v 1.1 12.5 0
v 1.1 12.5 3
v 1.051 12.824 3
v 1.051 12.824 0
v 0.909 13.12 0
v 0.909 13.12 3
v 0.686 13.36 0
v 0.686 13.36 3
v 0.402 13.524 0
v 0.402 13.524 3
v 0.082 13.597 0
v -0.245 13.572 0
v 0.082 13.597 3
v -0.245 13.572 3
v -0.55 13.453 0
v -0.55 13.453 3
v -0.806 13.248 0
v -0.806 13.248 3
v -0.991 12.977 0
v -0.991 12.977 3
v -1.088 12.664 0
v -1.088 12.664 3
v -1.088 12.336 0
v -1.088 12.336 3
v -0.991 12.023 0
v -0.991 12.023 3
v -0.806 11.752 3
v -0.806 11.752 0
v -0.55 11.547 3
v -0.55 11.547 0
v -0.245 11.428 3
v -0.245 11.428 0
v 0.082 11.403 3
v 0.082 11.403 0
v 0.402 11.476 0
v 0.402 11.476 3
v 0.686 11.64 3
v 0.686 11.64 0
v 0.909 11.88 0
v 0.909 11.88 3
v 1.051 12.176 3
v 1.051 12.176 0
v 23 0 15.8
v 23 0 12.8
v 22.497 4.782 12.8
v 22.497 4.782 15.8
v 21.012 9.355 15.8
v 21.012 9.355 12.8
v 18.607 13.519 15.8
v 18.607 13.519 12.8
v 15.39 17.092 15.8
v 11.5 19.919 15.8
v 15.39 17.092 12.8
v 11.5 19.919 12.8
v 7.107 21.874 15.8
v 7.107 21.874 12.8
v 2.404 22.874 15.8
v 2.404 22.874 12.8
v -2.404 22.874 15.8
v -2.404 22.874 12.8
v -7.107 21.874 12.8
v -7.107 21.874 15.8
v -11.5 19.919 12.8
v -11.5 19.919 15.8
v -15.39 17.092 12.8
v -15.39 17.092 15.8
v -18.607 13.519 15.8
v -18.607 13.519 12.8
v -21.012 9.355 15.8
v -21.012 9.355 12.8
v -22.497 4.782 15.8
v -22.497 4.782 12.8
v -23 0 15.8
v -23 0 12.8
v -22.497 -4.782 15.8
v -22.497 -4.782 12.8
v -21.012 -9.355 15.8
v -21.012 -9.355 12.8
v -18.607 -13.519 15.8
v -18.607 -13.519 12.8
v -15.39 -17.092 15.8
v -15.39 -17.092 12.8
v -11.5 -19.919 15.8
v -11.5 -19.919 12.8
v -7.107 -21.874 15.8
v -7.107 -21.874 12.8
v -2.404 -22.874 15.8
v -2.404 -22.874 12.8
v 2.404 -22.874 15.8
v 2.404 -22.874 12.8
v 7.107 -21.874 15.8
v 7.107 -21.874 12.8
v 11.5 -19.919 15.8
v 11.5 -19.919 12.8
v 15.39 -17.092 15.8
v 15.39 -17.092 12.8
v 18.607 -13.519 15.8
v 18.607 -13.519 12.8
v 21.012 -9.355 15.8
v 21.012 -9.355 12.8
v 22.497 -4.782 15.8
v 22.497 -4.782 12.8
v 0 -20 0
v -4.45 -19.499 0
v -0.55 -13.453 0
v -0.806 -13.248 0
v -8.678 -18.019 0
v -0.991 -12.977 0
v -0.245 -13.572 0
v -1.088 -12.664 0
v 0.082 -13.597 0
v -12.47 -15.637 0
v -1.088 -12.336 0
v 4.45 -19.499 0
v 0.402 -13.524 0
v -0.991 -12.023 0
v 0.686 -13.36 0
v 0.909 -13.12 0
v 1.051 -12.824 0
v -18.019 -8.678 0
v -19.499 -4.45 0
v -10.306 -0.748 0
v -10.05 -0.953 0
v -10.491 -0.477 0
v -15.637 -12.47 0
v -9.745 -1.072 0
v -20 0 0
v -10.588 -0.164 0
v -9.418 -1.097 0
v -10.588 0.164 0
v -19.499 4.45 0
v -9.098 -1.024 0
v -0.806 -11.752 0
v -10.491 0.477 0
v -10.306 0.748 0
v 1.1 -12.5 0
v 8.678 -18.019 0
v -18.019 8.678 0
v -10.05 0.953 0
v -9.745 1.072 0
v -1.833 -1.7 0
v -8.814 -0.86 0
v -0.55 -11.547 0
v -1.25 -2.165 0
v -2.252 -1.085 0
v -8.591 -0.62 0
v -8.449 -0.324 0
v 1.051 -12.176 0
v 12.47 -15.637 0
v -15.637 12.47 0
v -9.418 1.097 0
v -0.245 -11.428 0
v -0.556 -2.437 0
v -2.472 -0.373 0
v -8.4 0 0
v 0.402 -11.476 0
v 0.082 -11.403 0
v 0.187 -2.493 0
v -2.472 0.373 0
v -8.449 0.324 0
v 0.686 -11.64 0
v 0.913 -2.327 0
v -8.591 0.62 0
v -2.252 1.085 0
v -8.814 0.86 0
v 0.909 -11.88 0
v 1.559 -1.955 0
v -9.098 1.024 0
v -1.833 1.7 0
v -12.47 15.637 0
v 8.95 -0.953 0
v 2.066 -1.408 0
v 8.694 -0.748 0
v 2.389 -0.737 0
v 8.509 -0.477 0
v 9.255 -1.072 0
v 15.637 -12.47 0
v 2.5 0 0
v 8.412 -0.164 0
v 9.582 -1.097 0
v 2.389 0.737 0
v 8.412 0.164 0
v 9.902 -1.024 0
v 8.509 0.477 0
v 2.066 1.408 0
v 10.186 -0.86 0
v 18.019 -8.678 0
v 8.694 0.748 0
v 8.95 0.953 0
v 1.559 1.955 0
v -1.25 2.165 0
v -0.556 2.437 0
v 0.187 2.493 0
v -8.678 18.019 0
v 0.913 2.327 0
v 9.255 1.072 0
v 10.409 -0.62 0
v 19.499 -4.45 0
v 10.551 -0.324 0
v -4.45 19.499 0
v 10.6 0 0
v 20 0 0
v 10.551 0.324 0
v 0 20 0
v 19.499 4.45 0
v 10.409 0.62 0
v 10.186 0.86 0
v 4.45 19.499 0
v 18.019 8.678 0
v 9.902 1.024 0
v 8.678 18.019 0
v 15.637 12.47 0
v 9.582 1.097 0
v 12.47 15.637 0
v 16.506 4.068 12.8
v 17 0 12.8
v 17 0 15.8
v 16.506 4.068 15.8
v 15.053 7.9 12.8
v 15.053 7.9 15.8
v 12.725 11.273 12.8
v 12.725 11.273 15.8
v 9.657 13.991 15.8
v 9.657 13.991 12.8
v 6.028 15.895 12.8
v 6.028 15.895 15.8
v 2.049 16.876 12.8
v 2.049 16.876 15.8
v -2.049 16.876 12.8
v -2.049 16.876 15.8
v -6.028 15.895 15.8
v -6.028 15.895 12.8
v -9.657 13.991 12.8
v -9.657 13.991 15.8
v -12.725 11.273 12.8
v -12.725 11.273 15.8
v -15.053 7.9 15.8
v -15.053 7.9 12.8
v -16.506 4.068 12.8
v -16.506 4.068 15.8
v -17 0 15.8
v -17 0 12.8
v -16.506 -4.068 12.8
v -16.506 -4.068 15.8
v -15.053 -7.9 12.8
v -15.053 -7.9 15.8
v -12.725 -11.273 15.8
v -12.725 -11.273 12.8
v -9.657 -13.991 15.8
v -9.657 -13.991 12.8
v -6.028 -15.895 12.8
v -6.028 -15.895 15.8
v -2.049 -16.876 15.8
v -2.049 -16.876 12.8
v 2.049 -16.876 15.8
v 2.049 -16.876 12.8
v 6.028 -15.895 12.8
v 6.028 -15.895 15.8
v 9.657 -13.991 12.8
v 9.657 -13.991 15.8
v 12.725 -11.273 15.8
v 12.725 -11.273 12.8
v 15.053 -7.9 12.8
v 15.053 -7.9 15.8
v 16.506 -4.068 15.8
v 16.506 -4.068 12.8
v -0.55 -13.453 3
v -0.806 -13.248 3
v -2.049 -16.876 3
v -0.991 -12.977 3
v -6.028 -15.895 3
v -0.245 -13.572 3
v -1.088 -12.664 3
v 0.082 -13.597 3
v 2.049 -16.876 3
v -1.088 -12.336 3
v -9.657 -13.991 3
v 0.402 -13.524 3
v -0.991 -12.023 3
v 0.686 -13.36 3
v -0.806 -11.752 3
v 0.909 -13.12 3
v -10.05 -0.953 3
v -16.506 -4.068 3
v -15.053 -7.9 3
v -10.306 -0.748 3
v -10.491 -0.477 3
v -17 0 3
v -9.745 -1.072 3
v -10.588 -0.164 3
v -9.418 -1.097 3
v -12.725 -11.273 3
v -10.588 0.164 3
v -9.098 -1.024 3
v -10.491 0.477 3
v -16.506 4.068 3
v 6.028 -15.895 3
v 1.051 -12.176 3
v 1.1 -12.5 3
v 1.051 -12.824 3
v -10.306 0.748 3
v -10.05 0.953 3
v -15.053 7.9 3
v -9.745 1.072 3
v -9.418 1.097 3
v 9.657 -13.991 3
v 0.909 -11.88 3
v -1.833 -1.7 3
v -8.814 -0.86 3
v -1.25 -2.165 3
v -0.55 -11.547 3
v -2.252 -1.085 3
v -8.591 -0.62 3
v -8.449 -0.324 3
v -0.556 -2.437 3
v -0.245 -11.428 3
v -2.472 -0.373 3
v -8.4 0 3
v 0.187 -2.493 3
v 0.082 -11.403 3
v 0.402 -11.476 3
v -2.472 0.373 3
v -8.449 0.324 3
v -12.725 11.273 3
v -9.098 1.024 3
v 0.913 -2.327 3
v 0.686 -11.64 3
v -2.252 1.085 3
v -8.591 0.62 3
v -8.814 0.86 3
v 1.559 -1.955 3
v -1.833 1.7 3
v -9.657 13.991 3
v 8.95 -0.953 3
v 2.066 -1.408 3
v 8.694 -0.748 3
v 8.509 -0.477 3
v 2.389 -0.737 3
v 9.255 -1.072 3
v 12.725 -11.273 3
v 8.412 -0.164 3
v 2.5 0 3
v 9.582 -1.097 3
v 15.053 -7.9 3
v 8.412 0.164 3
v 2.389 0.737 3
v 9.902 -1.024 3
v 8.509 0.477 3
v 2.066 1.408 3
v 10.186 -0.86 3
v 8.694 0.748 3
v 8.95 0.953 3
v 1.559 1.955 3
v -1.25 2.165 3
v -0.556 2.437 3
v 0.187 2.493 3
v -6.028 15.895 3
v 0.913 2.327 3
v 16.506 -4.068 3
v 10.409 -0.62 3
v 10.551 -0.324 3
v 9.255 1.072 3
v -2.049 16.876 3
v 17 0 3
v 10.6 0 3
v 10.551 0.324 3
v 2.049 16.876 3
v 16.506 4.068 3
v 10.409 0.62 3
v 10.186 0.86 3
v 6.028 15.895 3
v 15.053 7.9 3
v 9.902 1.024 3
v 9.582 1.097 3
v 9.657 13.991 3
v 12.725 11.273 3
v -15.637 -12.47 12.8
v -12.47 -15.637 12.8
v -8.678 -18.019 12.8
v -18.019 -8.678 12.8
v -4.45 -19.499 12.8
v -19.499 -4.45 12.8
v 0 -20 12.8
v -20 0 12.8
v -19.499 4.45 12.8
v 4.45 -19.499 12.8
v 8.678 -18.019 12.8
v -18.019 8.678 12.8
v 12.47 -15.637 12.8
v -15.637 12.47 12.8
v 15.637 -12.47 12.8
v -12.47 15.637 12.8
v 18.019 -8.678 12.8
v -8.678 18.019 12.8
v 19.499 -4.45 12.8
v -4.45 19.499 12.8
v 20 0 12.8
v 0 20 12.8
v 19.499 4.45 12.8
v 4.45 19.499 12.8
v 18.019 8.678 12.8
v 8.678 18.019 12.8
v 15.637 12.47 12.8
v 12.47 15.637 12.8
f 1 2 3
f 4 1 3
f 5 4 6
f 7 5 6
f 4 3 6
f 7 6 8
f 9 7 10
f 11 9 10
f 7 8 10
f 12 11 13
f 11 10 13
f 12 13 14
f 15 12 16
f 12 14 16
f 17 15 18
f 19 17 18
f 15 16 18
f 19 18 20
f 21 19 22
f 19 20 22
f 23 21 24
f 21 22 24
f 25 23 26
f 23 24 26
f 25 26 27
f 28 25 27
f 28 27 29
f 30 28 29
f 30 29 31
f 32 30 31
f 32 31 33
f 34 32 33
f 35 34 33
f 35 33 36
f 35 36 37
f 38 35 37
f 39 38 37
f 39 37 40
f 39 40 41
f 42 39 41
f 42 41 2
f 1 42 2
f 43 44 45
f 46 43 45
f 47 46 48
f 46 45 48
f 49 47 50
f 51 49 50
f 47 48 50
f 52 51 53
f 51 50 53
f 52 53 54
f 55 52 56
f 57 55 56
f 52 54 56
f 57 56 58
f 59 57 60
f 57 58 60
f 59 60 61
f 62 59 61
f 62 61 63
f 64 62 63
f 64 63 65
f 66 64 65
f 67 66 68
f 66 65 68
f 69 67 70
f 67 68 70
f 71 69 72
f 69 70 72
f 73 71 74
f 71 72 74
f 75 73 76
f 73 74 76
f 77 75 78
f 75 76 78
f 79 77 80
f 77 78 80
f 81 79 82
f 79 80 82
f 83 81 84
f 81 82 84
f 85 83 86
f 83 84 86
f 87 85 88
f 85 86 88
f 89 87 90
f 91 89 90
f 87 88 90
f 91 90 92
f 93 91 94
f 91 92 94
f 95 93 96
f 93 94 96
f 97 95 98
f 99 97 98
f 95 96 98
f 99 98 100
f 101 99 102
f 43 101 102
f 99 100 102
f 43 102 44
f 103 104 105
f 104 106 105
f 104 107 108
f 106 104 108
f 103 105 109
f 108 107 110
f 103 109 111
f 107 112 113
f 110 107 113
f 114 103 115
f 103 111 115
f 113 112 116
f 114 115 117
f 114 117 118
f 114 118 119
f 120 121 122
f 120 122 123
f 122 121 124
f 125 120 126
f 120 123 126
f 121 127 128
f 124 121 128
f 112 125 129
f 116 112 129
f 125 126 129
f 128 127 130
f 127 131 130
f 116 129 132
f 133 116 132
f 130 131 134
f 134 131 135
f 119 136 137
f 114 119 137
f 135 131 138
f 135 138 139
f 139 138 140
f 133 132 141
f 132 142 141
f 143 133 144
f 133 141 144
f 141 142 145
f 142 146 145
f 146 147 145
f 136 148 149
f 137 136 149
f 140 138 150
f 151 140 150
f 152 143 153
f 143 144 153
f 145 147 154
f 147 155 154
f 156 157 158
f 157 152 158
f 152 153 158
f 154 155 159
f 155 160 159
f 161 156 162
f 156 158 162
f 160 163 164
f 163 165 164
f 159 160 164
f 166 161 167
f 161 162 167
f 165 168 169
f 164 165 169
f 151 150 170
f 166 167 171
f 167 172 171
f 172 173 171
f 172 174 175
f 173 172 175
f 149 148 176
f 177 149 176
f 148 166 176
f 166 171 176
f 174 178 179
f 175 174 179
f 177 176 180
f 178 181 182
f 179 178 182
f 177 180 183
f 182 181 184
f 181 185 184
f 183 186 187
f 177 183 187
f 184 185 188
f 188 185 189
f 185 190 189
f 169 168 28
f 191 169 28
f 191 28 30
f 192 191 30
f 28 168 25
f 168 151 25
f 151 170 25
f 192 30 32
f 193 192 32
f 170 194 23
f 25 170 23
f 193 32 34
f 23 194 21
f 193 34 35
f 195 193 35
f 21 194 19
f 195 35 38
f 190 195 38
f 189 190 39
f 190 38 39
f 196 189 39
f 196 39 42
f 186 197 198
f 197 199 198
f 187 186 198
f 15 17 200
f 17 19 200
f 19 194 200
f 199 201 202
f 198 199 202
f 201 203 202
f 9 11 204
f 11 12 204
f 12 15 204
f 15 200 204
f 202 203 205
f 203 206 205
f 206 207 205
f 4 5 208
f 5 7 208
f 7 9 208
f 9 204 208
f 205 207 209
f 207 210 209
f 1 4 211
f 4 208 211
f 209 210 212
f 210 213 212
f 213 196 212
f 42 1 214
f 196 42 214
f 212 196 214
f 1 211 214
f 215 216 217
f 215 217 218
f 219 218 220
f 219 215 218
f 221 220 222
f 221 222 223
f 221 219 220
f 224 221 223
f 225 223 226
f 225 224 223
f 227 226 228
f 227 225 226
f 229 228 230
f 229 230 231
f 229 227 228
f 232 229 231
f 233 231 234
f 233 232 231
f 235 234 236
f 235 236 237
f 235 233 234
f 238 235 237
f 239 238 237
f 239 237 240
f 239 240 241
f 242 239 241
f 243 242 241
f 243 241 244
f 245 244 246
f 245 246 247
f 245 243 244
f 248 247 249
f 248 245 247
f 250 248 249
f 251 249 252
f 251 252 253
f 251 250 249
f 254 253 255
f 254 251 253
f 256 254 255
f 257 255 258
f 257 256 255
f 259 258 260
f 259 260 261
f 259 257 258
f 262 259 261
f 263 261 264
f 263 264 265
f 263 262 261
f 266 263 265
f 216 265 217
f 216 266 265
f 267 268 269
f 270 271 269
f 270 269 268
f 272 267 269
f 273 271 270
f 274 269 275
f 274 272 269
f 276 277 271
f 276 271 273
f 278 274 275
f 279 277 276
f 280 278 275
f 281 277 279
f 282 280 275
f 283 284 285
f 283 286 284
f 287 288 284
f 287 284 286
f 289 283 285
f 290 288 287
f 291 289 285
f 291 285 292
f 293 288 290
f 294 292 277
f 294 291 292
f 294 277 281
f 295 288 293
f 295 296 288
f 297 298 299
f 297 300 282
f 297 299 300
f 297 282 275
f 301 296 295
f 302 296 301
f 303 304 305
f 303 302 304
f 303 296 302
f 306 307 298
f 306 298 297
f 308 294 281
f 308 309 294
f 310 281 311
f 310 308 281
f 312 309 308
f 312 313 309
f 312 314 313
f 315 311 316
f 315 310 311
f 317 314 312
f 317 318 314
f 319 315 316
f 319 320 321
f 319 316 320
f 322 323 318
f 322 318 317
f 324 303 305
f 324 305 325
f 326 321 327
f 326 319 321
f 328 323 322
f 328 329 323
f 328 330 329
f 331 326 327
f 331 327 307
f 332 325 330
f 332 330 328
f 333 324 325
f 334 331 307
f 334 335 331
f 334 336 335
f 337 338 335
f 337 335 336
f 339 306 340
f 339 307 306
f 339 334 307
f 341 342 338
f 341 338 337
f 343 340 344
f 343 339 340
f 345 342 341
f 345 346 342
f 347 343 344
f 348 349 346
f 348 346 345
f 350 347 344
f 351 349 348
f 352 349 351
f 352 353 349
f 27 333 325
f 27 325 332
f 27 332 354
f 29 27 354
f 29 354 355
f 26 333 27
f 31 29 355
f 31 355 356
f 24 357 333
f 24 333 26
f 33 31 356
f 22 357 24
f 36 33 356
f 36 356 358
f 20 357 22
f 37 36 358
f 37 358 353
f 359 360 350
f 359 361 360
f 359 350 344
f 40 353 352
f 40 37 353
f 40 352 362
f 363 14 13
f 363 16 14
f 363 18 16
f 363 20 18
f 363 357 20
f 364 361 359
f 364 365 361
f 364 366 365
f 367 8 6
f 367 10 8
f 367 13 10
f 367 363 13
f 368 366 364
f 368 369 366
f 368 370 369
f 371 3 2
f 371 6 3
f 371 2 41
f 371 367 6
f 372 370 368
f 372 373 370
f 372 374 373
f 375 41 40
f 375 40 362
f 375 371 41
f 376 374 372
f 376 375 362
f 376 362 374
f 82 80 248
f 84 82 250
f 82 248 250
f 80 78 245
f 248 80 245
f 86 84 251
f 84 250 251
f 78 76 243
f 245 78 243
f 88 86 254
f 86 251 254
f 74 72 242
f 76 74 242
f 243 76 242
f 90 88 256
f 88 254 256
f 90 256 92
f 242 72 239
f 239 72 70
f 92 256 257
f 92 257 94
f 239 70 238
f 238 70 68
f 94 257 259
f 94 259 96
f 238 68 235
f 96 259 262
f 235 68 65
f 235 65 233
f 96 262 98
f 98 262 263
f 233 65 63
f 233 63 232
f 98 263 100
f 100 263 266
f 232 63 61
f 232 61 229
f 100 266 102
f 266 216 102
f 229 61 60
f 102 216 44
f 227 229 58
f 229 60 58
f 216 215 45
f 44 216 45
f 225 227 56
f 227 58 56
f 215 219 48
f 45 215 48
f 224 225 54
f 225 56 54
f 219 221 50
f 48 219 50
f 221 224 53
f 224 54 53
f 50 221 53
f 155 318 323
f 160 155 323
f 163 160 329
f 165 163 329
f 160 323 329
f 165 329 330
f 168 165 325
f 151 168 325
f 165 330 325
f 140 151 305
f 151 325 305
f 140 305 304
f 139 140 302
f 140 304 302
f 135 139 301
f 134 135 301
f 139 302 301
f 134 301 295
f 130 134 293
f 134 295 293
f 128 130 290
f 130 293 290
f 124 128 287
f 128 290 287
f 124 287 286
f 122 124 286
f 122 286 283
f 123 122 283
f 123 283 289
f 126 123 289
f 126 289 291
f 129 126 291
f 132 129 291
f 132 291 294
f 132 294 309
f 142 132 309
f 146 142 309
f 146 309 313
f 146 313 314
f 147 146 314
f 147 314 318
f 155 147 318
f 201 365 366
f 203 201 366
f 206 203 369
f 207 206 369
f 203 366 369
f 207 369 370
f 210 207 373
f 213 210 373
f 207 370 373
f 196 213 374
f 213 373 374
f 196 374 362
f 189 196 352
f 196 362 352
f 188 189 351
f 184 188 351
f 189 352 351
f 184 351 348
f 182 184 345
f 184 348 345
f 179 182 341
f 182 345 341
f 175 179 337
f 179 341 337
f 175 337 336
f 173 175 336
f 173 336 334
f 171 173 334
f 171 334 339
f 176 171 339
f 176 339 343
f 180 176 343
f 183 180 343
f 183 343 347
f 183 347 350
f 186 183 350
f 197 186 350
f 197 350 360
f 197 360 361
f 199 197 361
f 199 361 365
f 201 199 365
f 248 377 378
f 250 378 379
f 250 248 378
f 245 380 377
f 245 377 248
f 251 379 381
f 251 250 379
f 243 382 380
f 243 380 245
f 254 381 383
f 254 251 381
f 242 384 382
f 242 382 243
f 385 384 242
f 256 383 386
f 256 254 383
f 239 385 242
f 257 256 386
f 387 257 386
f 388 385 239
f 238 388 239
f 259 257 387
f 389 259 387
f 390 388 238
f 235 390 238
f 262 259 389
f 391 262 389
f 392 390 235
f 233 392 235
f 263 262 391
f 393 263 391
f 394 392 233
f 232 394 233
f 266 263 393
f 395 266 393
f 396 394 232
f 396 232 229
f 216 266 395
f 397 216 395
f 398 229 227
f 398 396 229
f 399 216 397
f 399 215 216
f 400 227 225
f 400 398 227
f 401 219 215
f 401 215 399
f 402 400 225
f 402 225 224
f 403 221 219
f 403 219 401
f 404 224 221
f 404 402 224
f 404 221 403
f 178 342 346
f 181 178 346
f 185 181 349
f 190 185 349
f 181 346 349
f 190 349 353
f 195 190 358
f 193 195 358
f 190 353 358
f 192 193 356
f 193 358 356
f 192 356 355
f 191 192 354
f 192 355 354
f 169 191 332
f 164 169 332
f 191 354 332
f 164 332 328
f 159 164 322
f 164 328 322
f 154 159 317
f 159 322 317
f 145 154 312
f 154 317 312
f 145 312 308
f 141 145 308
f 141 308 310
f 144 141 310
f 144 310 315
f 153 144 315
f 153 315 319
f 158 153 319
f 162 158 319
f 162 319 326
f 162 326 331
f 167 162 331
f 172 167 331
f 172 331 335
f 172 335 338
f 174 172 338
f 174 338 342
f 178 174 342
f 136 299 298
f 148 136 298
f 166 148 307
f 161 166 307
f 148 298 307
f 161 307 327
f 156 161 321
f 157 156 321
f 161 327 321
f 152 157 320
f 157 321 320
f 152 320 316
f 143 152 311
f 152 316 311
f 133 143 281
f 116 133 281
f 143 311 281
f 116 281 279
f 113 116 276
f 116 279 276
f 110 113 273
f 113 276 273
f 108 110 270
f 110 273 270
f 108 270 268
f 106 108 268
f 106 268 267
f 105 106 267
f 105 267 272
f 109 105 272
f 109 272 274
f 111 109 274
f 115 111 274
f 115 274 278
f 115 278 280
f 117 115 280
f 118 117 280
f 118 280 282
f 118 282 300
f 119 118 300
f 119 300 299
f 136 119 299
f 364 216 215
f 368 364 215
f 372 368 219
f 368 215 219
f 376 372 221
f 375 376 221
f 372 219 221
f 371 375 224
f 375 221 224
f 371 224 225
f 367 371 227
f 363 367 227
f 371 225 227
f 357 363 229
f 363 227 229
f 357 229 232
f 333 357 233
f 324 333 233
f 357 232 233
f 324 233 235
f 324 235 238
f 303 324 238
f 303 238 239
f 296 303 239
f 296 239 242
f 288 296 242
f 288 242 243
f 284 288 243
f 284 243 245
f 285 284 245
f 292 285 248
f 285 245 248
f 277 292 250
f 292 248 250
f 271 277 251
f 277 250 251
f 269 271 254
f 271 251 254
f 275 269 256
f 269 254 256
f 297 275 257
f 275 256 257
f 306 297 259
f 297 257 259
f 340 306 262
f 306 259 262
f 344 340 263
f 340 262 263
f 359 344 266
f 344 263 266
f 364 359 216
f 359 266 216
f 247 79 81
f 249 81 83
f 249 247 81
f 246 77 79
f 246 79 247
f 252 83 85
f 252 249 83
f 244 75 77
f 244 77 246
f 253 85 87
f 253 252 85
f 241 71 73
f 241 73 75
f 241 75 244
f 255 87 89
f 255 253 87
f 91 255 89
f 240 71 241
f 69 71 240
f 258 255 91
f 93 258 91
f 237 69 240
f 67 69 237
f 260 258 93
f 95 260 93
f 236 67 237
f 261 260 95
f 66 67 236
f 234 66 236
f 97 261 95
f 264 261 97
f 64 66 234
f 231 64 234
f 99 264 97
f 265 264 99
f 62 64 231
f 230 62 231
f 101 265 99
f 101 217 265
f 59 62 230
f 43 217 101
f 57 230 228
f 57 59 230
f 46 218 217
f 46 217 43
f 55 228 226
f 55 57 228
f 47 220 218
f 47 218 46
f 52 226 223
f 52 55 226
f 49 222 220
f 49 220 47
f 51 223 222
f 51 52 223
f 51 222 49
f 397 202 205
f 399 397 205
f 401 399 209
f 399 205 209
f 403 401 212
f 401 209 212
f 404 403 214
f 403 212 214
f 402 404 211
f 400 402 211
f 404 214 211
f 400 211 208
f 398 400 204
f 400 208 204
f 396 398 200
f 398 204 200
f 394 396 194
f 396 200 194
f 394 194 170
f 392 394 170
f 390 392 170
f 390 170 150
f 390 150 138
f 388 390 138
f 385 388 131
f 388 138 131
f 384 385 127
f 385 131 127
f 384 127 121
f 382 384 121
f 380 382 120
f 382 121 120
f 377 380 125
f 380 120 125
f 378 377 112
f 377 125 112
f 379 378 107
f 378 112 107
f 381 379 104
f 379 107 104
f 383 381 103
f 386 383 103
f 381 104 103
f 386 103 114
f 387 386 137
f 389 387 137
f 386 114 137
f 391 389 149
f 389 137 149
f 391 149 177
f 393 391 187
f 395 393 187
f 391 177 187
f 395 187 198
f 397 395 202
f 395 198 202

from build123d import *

# Parameters (mm, degrees)
SKETCH_1_R          = 20
EXTRUDE_1_DEPTH     = 12.8
SKETCH_2_R          = 17
CUT_EXTRUDE_1_DEPTH = 9.8
SKETCH_3_R          = 23
SKETCH_3_R_2        = 17
EXTRUDE_2_DEPTH     = 3
SKETCH_4_R          = 1.1
CUT_EXTRUDE_2_DEPTH = 35.954827993
SKETCH_6_R          = 2.5
CUT_EXTRUDE_4_DEPTH = 10


with BuildPart() as part:
    # 草图1 → 凸台-拉伸1 (new body)
    with BuildSketch(Plane.XY):
        Circle(SKETCH_1_R)
    extrude(amount=EXTRUDE_1_DEPTH)

    # 草图2 → 切除-拉伸1 (cut)
    with BuildSketch(Plane.XY.offset(12.8)):
        Circle(SKETCH_2_R)
    extrude(amount=-CUT_EXTRUDE_1_DEPTH, mode=Mode.SUBTRACT)

    # 草图4 → 切除-拉伸2 (cut, through all)
    with BuildSketch(Plane.XY.offset(3)):
        with Locations((0, -12.5)):
            Circle(SKETCH_4_R)
        with Locations((0, 12.5)):
            Circle(SKETCH_4_R)
        with Locations((9.5, 0)):
            Circle(SKETCH_4_R)
        with Locations((-9.5, 0)):
            Circle(SKETCH_4_R)
    extrude(amount=-CUT_EXTRUDE_2_DEPTH, mode=Mode.SUBTRACT)

    # 草图6 → 切除-拉伸4 (cut)
    with BuildSketch(Plane.XY.offset(3)):
        Circle(SKETCH_6_R)
    extrude(amount=-CUT_EXTRUDE_4_DEPTH, mode=Mode.SUBTRACT)


with BuildPart() as body_2:
    # 草图3 → 凸台-拉伸2 (new body)
    with BuildSketch(Plane.XY.offset(12.8)):
        Circle(SKETCH_3_R)
        Circle(SKETCH_3_R_2, mode=Mode.SUBTRACT)
    extrude(amount=EXTRUDE_2_DEPTH)


solid = Compound([part.part, body_2.part])
